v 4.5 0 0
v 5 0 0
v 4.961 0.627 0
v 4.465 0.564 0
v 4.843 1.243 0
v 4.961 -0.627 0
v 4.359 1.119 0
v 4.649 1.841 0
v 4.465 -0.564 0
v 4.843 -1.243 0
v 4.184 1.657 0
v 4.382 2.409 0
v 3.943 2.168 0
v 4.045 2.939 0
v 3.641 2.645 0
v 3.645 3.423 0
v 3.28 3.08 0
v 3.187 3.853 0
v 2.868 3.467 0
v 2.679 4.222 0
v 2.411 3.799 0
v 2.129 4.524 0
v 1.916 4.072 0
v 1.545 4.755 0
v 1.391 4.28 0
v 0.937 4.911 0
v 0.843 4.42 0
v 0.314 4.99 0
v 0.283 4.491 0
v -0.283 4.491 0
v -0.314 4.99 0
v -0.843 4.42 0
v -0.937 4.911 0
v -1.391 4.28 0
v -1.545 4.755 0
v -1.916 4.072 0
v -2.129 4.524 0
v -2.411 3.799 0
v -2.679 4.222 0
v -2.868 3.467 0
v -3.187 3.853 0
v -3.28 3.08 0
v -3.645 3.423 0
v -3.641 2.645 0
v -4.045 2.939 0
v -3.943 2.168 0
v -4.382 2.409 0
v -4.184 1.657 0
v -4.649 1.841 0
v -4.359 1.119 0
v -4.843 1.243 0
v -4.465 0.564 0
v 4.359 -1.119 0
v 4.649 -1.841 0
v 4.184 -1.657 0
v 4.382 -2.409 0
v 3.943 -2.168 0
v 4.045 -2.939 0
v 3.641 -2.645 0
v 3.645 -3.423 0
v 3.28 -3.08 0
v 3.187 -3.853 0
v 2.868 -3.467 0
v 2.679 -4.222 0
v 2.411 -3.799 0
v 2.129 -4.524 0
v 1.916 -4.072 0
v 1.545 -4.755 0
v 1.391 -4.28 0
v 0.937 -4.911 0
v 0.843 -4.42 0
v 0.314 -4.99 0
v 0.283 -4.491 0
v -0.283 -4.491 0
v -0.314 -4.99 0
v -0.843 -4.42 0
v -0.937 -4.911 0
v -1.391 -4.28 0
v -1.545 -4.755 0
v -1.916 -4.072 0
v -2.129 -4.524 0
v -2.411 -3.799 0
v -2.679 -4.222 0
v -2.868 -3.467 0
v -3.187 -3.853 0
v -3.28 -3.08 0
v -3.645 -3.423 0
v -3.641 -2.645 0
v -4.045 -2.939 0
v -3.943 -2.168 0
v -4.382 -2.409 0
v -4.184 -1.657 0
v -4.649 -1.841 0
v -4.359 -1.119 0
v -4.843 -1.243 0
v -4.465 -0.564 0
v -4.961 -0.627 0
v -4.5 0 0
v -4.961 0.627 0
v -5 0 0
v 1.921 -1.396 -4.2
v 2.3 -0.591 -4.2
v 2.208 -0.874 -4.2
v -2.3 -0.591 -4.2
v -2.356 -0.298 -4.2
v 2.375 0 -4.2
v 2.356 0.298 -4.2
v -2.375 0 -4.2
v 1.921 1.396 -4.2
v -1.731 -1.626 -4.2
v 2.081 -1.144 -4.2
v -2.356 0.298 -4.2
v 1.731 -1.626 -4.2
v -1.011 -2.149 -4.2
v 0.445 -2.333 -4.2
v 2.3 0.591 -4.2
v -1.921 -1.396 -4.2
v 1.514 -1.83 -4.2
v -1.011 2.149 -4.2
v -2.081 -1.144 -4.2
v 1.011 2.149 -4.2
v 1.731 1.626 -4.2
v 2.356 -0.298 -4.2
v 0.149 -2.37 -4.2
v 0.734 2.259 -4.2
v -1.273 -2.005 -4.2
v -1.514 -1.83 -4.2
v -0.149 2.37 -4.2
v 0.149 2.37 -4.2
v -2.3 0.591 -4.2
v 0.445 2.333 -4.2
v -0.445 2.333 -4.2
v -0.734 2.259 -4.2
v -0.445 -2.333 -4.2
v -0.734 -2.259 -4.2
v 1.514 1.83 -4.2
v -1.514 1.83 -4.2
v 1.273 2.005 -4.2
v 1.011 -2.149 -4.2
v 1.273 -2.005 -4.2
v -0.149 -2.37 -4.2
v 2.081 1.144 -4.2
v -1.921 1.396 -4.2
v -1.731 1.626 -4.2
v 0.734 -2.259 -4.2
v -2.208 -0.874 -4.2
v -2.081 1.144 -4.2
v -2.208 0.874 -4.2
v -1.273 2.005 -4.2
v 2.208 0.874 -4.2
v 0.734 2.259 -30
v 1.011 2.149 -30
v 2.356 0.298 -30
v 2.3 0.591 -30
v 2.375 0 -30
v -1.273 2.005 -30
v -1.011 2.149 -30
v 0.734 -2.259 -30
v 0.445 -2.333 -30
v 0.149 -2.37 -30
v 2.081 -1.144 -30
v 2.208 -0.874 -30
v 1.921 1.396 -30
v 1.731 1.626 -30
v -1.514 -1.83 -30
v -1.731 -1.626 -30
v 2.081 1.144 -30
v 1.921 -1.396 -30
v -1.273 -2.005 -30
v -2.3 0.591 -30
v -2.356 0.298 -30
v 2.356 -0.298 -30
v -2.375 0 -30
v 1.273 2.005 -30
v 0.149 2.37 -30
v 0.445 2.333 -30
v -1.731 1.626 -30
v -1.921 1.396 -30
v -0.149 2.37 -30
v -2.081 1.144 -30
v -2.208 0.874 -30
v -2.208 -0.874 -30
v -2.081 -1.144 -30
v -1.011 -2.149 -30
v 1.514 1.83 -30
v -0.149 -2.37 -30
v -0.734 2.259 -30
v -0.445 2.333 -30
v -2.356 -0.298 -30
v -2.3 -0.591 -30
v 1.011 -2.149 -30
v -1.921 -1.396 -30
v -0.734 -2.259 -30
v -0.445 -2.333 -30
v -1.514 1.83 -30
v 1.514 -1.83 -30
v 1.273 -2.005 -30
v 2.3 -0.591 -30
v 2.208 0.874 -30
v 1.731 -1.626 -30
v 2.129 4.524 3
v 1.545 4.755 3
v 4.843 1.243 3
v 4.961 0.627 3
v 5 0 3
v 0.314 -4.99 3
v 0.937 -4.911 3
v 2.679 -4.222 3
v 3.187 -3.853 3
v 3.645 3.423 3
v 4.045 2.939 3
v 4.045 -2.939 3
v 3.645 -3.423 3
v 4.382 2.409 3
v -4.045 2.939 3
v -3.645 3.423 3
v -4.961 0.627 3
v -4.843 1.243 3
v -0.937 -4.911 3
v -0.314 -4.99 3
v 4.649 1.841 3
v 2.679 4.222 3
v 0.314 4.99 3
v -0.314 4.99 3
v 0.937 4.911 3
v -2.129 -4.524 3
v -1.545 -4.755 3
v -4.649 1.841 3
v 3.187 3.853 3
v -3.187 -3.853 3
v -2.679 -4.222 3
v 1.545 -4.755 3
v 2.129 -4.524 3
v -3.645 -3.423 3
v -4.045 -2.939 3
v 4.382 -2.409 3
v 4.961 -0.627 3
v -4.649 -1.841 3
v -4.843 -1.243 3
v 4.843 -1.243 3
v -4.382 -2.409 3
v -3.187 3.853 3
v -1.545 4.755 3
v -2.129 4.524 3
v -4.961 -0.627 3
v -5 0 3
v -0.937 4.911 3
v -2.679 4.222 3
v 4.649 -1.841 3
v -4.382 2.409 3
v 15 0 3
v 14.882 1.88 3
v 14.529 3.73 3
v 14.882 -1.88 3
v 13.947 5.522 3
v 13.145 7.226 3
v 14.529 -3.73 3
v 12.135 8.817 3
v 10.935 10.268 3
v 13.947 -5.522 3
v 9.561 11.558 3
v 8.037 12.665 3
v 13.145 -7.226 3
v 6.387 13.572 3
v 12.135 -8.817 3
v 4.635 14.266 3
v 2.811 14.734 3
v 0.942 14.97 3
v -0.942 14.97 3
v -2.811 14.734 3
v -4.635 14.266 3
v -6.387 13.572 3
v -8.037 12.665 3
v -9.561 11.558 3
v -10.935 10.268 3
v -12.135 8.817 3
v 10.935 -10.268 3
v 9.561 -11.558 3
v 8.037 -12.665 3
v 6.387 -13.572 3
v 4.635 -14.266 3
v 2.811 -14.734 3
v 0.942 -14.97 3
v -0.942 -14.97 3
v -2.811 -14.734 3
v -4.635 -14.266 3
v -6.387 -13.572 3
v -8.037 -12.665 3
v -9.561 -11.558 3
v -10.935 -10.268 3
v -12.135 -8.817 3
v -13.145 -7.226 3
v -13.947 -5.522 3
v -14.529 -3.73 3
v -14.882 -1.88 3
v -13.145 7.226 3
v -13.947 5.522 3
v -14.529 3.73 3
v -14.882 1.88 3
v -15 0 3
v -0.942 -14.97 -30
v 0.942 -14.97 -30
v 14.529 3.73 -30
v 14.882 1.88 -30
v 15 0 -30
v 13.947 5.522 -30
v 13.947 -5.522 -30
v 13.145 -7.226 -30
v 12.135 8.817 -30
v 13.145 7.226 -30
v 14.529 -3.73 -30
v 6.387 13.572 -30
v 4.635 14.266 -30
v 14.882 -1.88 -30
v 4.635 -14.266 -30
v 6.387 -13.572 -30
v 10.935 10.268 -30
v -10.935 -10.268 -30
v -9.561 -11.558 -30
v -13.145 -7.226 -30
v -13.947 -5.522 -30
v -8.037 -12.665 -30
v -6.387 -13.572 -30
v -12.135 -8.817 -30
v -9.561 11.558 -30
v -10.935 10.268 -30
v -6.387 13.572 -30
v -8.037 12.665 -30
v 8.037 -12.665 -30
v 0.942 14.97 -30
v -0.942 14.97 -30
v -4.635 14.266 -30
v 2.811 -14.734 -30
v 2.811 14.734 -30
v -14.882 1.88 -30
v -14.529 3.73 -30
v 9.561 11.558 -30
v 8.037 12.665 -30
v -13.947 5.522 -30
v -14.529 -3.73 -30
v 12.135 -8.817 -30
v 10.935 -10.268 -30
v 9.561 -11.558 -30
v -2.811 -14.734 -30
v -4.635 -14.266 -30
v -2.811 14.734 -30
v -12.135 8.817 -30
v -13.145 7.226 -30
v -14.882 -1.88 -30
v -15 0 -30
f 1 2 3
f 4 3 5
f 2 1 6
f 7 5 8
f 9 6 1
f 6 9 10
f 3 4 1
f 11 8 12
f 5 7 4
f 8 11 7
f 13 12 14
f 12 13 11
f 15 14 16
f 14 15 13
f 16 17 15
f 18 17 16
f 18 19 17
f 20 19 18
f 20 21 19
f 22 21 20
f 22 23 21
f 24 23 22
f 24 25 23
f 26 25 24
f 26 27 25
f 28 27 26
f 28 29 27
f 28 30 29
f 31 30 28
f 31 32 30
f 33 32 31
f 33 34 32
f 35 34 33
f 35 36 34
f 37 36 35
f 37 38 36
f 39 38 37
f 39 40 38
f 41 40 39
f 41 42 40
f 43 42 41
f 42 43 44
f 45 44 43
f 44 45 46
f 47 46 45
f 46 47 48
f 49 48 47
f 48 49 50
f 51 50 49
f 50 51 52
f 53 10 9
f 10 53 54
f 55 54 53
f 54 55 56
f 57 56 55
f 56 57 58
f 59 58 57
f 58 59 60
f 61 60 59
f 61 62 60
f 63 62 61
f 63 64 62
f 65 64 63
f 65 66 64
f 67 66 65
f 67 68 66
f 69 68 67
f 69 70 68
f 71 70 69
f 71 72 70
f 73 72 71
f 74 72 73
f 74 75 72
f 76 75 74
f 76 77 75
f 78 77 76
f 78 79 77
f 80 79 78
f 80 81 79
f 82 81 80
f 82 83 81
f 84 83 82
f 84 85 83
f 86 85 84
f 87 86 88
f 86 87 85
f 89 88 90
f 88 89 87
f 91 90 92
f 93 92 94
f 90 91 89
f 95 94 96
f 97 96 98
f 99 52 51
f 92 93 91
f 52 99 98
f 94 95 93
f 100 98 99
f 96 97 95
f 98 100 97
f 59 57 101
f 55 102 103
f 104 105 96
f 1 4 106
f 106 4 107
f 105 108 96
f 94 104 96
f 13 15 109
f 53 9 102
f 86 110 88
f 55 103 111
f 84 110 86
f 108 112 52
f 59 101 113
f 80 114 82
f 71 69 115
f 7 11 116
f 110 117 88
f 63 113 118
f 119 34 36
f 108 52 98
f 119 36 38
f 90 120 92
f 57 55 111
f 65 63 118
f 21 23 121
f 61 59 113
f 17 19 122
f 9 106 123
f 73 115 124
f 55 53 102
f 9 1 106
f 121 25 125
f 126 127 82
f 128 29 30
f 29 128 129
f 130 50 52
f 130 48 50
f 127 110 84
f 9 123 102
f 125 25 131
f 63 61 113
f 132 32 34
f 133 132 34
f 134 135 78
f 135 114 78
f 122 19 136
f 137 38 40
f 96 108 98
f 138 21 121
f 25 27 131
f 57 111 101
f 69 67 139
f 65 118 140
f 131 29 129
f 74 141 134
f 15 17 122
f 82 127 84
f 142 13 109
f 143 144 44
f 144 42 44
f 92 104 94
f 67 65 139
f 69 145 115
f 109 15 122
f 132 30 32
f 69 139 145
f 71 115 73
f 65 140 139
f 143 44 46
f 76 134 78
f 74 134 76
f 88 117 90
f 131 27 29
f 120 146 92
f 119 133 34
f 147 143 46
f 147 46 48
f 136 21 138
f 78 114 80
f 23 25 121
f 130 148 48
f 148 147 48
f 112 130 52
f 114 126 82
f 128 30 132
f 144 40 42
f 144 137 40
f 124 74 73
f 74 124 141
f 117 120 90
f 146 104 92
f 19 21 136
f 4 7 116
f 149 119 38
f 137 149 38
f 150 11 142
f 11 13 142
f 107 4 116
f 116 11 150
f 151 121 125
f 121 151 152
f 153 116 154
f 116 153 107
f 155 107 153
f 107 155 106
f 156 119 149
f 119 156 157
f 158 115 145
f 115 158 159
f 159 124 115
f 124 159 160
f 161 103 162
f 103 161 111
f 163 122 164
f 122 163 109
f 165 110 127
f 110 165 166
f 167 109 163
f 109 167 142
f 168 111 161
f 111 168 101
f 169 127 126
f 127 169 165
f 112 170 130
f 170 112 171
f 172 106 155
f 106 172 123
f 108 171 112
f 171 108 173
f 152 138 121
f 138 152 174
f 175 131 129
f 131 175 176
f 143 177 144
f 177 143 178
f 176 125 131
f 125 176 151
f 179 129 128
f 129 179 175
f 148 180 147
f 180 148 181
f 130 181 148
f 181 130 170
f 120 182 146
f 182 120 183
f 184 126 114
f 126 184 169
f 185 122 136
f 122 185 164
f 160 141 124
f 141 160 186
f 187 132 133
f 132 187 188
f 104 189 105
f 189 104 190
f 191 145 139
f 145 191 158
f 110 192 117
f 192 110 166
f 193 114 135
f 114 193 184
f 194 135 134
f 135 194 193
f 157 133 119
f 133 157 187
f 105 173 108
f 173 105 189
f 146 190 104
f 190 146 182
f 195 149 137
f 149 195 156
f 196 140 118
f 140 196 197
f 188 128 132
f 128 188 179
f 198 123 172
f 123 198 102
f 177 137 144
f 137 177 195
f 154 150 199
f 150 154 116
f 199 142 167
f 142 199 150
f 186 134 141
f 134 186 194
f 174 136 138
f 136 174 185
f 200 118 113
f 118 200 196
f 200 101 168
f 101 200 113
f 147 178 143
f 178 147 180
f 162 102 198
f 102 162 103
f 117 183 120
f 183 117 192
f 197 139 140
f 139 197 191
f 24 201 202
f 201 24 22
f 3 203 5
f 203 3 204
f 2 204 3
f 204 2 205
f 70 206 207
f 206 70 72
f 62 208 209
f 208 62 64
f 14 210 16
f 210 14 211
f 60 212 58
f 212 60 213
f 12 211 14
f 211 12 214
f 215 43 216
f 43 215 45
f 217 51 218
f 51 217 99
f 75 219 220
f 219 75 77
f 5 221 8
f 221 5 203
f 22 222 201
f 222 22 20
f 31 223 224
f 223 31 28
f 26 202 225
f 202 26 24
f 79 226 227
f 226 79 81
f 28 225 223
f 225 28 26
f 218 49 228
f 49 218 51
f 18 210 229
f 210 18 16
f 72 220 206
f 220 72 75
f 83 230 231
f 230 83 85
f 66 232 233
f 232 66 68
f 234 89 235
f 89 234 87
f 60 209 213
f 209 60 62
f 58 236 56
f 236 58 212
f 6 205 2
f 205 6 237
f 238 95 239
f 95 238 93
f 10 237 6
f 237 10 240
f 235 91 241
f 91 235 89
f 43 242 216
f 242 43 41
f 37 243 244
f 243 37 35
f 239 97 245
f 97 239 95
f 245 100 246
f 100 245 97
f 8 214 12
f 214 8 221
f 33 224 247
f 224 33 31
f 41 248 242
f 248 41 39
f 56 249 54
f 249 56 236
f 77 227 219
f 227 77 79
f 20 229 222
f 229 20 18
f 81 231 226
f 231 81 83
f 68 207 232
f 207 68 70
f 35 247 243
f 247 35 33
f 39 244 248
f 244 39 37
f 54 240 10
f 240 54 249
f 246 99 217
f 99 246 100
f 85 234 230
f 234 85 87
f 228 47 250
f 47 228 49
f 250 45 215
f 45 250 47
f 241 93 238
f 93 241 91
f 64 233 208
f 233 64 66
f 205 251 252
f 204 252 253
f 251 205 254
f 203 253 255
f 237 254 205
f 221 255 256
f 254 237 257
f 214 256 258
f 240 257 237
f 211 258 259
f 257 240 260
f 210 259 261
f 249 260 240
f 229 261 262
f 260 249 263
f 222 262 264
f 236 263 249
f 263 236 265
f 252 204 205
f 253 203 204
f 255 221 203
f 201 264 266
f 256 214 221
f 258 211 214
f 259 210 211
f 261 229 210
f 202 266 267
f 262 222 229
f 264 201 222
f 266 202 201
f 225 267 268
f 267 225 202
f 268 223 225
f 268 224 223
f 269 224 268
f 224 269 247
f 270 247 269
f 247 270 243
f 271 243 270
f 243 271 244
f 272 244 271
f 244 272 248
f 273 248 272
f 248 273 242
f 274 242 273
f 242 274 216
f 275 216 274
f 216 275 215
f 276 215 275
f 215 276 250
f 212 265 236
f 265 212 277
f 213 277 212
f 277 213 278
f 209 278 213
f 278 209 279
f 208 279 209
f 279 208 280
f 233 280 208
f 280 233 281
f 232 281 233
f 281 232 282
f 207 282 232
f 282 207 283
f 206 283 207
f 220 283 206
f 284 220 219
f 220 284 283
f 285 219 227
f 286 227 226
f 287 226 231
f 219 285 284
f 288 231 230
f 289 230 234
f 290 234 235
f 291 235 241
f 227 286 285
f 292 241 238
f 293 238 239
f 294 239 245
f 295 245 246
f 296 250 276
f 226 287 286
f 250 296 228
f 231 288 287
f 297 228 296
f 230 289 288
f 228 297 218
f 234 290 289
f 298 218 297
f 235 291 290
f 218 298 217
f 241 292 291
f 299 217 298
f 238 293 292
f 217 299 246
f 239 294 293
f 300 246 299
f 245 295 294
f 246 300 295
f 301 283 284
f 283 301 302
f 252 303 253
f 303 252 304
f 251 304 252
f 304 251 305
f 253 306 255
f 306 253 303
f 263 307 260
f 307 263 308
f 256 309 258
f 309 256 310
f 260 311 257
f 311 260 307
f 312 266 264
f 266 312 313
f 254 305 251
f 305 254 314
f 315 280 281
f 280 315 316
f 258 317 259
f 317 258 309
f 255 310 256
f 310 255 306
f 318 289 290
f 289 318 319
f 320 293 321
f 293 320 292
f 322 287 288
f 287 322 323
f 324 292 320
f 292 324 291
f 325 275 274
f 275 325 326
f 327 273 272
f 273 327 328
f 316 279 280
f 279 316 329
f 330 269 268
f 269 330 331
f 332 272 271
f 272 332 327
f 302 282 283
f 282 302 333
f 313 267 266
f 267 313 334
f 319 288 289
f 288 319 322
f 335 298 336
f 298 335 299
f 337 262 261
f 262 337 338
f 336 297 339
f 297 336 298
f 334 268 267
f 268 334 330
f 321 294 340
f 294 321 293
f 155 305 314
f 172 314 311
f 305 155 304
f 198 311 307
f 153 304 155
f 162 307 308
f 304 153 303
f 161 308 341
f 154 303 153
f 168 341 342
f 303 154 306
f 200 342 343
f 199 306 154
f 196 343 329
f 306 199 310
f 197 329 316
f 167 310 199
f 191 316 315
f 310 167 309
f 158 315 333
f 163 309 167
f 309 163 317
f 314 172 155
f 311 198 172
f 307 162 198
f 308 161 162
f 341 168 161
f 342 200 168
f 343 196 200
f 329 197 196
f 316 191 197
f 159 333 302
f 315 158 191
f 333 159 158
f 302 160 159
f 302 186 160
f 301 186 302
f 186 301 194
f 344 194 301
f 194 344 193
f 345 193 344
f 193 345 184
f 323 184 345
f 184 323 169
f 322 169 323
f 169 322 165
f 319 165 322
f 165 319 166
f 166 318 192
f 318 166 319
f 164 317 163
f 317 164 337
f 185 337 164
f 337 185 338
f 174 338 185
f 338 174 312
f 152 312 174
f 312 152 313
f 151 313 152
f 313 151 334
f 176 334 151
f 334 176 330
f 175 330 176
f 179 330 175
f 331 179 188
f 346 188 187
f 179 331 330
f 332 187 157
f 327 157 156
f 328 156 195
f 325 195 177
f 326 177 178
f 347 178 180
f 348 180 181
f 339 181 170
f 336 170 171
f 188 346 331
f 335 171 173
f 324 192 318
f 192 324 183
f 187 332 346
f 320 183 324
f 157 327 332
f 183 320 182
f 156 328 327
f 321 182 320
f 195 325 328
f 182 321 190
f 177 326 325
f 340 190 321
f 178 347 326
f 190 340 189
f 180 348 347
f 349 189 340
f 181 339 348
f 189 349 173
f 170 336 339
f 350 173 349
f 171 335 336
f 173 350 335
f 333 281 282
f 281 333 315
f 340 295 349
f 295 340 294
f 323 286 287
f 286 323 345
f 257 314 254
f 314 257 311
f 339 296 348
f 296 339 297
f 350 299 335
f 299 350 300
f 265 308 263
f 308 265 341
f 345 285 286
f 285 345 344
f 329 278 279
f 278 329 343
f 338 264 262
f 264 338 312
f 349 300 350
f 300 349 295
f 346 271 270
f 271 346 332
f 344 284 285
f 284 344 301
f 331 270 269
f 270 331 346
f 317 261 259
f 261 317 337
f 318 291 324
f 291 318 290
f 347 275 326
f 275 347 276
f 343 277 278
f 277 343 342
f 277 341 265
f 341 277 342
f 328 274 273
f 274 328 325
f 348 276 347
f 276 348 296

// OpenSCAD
$fn = 50;


difference() {
	union() {
		translate(v = [0, 0, -30.0000000000]) {
			cylinder(h = 33, r = 15.0000000000);
		}
	}
	union() {
		translate(v = [0, 0, 0]) {
			rotate(a = [0, 0, 0]) {
				difference() {
					union() {
						translate(v = [0, 0, -33.0000000000]) {
							cylinder(h = 33, r = 2.2500000000);
						}
						translate(v = [0, 0, -4.2000000000]) {
							cylinder(h = 4.2000000000, r1 = 2.3750000000, r2 = 4.5000000000);
						}
						translate(v = [0, 0, -33.0000000000]) {
							cylinder(h = 33, r = 2.3750000000);
						}
						translate(v = [0, 0, -33.0000000000]) {
							cylinder(h = 33, r = 2.2500000000);
						}
					}
					union();
				}
			}
		}
		#cylinder(h = 3, r = 5.0000000000);
	}
}
